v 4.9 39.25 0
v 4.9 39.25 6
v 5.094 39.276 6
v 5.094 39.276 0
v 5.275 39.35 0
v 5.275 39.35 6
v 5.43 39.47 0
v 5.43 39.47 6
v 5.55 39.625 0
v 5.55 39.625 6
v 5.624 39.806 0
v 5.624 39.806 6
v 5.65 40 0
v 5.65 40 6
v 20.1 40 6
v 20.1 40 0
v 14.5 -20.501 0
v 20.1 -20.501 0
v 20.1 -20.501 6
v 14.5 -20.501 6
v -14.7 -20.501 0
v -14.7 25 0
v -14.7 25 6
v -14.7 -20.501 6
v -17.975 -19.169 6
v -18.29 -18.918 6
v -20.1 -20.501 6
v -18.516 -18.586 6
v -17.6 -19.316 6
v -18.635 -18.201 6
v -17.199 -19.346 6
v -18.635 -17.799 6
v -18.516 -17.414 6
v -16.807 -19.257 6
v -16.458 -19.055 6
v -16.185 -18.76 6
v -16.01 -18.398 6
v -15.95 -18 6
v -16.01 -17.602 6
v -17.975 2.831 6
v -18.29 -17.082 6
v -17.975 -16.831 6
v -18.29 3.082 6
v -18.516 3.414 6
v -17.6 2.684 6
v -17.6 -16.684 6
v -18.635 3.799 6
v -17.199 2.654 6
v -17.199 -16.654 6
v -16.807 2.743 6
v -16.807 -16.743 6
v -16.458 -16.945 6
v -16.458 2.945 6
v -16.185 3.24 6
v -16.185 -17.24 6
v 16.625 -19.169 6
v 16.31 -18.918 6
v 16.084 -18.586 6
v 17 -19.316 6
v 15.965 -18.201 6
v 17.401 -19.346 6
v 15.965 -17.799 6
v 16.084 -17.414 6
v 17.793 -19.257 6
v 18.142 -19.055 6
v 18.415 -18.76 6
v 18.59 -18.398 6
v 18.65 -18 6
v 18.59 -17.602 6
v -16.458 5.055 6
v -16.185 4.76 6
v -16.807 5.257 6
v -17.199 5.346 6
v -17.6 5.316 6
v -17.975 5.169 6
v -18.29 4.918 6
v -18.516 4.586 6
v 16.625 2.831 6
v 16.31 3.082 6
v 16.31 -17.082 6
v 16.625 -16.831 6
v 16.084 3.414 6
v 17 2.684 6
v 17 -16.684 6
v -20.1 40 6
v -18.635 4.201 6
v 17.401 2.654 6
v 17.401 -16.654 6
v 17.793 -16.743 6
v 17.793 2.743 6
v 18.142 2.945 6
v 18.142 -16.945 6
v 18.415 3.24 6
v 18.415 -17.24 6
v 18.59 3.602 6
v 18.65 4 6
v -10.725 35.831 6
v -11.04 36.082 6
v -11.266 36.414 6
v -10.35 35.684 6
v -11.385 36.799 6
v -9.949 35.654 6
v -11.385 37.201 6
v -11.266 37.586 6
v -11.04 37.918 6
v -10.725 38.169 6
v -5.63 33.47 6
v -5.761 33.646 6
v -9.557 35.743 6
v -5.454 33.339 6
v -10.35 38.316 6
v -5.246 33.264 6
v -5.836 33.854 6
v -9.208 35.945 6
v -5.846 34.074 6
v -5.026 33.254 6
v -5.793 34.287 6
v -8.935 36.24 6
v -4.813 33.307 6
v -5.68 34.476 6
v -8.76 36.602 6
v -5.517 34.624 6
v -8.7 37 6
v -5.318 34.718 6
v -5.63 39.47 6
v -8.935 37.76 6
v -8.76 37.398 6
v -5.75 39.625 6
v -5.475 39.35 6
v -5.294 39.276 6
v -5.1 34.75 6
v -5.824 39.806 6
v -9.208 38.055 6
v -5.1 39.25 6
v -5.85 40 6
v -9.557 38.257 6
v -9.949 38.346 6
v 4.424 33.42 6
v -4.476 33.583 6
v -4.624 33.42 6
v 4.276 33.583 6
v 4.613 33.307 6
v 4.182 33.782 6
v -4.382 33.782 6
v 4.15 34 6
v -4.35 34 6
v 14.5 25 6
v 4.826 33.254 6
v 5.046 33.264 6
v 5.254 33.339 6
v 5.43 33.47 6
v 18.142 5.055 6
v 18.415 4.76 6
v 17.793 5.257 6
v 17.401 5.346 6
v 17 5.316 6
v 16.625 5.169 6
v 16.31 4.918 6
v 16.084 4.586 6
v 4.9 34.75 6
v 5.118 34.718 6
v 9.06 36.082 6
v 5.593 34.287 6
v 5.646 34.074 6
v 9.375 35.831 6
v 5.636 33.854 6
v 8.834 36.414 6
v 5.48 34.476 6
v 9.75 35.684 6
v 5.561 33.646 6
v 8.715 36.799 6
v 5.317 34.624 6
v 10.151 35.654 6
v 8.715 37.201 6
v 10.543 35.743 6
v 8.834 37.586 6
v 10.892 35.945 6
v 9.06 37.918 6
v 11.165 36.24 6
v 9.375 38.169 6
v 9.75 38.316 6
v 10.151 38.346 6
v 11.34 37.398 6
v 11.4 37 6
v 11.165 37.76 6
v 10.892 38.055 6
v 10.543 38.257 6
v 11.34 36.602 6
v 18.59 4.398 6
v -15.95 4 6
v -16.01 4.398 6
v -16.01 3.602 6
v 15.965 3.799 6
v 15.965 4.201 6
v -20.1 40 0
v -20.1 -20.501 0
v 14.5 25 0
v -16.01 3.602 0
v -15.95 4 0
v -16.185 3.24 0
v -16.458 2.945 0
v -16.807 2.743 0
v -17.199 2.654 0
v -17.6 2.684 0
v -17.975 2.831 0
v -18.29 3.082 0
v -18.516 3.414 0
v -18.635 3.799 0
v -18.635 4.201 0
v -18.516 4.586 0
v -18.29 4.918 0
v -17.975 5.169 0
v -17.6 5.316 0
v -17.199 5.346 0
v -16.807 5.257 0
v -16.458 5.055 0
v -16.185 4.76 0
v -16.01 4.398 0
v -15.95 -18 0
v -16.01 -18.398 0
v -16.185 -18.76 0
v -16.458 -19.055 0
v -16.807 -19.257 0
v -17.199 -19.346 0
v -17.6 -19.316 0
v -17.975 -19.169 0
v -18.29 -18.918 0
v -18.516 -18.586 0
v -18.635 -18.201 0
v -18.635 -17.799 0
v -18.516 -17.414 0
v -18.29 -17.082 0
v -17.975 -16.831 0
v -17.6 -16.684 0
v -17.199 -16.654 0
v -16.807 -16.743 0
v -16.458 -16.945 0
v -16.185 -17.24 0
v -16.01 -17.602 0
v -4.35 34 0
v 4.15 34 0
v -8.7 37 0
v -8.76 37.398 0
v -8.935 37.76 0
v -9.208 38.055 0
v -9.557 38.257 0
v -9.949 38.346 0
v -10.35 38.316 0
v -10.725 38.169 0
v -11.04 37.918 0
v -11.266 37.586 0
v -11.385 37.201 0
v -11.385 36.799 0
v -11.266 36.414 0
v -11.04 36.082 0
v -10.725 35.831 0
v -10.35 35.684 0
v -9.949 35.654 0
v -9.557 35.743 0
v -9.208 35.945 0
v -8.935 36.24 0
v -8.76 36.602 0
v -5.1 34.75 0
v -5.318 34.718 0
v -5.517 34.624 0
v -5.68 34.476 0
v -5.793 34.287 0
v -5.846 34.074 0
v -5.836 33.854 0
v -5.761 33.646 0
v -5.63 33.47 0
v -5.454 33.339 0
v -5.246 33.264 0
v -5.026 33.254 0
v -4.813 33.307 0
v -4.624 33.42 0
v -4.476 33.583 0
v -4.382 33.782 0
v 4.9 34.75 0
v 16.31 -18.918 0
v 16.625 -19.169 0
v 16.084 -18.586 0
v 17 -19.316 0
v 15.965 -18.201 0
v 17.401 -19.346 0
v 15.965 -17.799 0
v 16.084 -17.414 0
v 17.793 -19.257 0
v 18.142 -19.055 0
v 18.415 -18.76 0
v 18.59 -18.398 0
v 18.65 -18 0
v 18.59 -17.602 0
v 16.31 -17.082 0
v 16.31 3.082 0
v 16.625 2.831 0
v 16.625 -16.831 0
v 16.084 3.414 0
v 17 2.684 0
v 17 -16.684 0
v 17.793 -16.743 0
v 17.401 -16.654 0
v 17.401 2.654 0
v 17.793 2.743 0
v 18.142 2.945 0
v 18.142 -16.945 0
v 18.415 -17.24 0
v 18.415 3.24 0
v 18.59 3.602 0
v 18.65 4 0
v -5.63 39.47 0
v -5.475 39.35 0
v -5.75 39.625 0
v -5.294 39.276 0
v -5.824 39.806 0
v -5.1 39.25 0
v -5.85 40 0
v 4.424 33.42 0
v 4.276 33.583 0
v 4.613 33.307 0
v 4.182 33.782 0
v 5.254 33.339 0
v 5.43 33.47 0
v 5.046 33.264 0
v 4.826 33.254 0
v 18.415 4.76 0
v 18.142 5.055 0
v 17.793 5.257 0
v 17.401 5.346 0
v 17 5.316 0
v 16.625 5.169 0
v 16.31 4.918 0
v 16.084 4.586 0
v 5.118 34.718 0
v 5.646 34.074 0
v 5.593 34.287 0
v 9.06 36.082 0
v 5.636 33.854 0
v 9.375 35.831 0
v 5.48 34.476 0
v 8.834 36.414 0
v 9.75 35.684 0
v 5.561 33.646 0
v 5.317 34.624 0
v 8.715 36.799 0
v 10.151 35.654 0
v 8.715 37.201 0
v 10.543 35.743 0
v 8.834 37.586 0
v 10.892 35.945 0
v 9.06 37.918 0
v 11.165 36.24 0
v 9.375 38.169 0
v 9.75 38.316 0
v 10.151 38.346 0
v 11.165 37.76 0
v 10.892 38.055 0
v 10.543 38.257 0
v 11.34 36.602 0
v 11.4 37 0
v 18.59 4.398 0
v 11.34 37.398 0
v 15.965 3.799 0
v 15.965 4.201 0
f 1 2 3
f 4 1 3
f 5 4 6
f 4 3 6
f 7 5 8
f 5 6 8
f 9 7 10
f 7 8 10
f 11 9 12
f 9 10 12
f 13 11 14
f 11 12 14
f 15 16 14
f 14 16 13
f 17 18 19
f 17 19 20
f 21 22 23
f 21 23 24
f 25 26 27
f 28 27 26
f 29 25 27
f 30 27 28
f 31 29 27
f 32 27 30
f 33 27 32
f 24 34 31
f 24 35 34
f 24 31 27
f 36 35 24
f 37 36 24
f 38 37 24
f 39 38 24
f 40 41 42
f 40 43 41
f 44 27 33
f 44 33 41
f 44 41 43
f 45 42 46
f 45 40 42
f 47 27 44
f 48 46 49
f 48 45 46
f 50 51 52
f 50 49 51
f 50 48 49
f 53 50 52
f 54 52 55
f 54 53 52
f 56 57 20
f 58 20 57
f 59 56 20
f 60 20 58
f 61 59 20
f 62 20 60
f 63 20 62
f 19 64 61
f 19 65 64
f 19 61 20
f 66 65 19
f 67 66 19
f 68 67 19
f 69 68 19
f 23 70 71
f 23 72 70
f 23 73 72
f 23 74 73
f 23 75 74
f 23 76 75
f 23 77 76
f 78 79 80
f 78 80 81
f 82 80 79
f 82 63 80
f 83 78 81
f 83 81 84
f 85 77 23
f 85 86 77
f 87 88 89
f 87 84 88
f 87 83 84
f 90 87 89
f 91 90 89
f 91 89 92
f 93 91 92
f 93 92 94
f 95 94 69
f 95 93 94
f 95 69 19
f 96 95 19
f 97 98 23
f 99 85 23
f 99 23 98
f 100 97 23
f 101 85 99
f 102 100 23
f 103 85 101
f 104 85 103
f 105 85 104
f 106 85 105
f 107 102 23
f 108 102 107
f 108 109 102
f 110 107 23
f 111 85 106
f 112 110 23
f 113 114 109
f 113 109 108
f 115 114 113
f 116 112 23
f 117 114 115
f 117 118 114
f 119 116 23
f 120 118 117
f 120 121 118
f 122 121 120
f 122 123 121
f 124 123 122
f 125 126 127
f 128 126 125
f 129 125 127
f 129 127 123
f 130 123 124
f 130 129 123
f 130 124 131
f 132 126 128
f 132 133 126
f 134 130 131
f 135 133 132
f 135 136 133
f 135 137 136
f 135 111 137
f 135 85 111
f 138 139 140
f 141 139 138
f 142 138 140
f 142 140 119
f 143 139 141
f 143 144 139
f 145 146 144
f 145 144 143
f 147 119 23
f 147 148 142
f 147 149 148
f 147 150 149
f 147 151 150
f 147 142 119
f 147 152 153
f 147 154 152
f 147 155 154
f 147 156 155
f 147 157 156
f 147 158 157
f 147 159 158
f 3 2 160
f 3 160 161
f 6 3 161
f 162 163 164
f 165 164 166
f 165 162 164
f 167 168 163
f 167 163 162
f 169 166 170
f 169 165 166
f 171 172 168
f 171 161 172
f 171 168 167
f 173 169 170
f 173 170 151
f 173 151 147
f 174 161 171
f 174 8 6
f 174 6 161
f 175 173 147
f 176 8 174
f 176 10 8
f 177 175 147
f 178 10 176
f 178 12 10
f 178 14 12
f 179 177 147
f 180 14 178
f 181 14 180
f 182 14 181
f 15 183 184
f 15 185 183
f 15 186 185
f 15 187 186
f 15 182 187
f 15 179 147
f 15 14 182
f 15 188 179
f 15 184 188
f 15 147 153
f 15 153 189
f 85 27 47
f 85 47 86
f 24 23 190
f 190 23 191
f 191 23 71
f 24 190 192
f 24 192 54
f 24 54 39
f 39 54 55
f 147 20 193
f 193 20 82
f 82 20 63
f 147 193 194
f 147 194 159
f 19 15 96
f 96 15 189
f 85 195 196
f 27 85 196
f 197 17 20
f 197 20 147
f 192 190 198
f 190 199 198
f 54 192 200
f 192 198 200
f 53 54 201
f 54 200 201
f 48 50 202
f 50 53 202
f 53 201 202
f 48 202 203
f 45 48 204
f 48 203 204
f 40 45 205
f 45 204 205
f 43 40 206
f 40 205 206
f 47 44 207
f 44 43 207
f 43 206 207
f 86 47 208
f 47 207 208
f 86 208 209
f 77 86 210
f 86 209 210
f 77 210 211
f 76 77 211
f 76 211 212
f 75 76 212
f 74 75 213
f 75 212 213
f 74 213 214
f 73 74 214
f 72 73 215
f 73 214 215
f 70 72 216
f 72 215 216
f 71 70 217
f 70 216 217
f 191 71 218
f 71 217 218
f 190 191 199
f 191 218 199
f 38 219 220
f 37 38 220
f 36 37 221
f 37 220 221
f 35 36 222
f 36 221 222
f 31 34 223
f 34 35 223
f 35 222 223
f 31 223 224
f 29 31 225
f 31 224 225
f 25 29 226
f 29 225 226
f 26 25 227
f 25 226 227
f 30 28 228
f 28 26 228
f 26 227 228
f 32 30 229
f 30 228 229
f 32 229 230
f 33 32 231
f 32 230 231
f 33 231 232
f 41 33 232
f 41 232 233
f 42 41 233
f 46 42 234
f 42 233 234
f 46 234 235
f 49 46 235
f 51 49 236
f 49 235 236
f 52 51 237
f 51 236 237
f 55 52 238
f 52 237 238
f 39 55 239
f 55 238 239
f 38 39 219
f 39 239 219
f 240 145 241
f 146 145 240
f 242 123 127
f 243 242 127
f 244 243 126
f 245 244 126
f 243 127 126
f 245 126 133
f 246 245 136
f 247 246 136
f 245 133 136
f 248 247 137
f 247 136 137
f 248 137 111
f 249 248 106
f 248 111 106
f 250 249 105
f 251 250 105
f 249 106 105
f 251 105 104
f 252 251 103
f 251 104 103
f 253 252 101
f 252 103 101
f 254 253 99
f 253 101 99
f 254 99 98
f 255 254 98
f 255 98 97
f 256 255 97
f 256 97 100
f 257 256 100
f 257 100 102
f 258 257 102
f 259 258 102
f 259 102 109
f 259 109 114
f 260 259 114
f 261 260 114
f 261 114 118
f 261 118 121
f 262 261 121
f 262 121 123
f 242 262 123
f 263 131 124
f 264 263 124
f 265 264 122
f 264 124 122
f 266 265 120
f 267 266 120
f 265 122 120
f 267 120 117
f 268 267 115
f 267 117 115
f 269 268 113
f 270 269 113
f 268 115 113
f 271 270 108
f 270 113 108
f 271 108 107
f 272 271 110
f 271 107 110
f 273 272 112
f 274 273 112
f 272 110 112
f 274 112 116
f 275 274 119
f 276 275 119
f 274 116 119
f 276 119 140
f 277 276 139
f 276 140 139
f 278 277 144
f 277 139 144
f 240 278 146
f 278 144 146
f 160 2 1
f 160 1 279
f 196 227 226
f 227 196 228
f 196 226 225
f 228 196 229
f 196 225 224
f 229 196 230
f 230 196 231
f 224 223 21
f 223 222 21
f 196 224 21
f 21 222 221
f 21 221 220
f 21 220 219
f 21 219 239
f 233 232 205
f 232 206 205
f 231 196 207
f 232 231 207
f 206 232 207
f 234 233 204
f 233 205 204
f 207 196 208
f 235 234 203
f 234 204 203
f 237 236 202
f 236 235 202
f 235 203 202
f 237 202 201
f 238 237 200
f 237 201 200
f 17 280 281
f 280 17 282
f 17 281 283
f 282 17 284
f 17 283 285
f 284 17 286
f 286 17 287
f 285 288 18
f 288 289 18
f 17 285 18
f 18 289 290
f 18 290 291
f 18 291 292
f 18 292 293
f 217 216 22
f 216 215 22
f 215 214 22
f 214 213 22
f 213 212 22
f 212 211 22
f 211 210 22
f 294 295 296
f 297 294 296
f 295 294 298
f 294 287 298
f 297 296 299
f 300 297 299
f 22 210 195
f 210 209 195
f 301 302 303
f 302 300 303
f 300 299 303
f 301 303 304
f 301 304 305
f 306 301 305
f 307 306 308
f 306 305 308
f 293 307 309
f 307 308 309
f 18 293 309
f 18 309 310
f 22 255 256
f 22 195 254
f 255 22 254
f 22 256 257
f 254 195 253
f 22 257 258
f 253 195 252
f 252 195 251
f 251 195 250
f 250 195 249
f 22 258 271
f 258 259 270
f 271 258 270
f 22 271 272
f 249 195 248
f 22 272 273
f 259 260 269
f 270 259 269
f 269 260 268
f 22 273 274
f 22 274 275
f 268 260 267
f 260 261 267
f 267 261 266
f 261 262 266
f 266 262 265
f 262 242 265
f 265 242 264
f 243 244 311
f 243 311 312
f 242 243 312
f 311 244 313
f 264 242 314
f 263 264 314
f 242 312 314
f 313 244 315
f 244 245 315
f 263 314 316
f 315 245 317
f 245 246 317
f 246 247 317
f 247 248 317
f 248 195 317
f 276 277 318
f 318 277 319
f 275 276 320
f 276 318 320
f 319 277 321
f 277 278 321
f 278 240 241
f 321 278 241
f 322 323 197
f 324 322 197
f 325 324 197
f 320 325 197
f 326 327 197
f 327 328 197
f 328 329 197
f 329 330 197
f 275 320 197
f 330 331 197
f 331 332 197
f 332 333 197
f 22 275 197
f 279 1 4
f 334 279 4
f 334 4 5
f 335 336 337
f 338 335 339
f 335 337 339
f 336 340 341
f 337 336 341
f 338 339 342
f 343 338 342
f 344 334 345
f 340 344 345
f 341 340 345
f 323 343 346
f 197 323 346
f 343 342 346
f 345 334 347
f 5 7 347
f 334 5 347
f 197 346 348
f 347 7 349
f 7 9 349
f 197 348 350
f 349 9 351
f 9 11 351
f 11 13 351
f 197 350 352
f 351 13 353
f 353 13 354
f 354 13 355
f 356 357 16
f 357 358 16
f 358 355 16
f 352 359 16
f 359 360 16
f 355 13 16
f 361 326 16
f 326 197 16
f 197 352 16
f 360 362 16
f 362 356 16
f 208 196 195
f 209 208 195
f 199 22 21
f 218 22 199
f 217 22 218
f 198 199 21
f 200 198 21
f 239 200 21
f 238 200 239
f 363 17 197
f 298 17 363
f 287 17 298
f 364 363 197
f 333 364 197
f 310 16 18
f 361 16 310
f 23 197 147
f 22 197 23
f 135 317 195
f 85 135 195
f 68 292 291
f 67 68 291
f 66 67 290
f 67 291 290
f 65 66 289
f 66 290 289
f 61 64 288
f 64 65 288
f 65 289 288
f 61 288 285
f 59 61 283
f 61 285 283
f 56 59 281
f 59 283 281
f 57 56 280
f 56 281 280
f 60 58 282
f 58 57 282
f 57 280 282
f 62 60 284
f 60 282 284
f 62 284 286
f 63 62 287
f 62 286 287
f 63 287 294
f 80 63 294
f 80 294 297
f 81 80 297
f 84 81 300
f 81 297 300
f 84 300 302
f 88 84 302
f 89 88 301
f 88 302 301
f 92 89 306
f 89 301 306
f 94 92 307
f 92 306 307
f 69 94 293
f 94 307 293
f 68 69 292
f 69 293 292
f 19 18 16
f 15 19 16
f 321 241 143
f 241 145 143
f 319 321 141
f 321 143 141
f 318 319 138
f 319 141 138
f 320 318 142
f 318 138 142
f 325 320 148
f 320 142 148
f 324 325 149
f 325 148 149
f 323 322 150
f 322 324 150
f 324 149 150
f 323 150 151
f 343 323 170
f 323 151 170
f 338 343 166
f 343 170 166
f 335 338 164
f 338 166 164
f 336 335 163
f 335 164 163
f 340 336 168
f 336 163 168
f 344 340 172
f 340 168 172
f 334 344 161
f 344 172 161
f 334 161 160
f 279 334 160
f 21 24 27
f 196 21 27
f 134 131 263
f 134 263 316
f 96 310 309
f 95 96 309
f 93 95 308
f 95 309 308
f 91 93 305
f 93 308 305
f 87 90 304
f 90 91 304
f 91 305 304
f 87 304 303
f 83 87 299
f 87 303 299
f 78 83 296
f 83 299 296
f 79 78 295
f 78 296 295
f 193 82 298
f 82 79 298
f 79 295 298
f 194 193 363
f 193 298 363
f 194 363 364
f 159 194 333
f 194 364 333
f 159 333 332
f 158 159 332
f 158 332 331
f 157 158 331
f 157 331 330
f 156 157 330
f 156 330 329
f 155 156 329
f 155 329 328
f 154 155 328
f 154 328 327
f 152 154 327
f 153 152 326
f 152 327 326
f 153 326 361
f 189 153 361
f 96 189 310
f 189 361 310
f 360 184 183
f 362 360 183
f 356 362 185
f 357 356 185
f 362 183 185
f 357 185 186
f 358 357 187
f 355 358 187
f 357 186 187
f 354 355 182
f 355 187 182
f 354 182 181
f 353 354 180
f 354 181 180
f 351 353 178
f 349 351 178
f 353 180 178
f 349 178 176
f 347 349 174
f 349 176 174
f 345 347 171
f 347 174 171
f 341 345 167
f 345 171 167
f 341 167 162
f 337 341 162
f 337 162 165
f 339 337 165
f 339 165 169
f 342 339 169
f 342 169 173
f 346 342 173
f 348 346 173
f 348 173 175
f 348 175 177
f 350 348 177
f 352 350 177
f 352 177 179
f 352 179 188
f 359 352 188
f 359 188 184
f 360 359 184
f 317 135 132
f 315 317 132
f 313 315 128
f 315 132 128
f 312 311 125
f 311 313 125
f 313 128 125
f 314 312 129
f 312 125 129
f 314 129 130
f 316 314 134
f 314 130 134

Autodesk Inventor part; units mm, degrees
ref_plane "YZ Plane" through (0, 0, 0) normal (1, 0, 0) x (0, 1, 0)
ref_plane "XZ Plane" through (0, 0, 0) normal (0, 1, 0) x (-1, 0, 0)
ref_plane "XY Plane" through (0, 0, 0) normal (0, 0, 1) x (1, 0, 0)
ref_plane "작업 평면1" through (0, 0, 0) normal (0, 0, 1) x (1, 0, 0)
sketch "스케치1" plane through (0, 0, 0) normal (0, 0, 1) x (1, 0, 0)
  line L0 (14.5, -41) -> (14.5, 11) projected
  line L1 (20.1, -39.6766) -> (20.1, 4.5766) projected
  line L2 (-20.1, 4.5766) -> (-20.1, -39.6766) projected
  line L3 (-14.5, 11) -> (-14.5, -41) projected
  circle A0 centre (-17.3, -18) radius 1.35 projected
  circle A1 centre (17.3, -18) radius 1.35 projected
  circle A2 centre (17.3, 4) radius 1.35 projected
  circle A3 centre (-17.3, 4) radius 1.35 projected
  circle A4 centre (17.3, -18) radius 1.45
  circle A5 centre (-17.3, -18) radius 1.45
  circle A6 centre (-17.3, 4) radius 1.45
  circle A7 centre (17.3, 4) radius 1.45
  line L4 (14.7, -41) -> (14.7, 11)
  line L5 (-14.7, 11) -> (-14.7, -41)
  line L6 (20.1, -20.5011) -> (-20.1, -20.5011)
  line L7 (-20.1, 0) -> (-20.1, 40)
  line L8 (20.1, -20.5011) -> (20.1, 40)
  line L9 (20.1, 40) -> (-20.1, 40)
  line L10 (14.5, 0) -> (14.5, 25)
  line L11 (14.5, 25) -> (-14.7, 25)
  line L12 (-14.7, 25) -> (-14.7, 0)
  line L13 (20.1, 40) -> (15.1, 40)
  line L14 (20.1, 40) -> (10.05, 40)
  line L15 (10.05, 40) -> (0, 40)
  line L16 (0, 40) -> (-10.05, 40)
  line L17 (-10.05, 40) -> (-20.1, 40)
  line L18 (20.1, 25) -> (20.1, 32.5)
  circle A8 centre (10.05, 32.5) radius 1.4
  circle A9 centre (-10.05, 32.5) radius 1.4
  point P0 (0, 0)
  point P1 (0, -20.5011)
  point P2 (-14.7, -20.5011)
  point P3 (14.5, -20.5011)
  dimension "d0" = 0.1
  dimension "d1" = 0.1
  dimension "d2" = -0.1
  dimension "d3" = 0.1
  dimension "d4" = 0.2
  dimension "d5" = 0.2
  dimension "d6" = 20.5011
  dimension "d7" = 40
  dimension "d9" = 15
  dimension "d12" = 5
  dimension "d13" = 40.2
  dimension "d14" = 10.05
  dimension "d15" = 10.05
  dimension "d16" = 10.05
  dimension "d17" = 10.05
  dimension "d18" = 7.5
  dimension "d19" = 2.8
  dimension "d20" = 2.8
  dimension "d21" = 20.1
extrude "돌출1" add sketch "스케치1" along normal blind 6 contours L0 L10 L11 L12 L5 L6 L2 L7 L9 L8 L1 | A4 | A5 | A6 | A7 | A8 | A9
sketch "스케치3" plane through (-20.1, 40, 0) normal (0, 1, 0) x (1, 0, 0)
  line L0 (40.2, 0) -> (0, 0) projected
  line L1 (0, 0) -> (0, -6) projected
  line L2 (40.2, -6) -> (0, -6) projected
  line L3 (40.2, 0) -> (40.2, -6) projected
  point P0 (20.1, 0)
  dimension "d29" = 40.2
sketch "스케치4" plane through (0, 0, 6) normal (0, 0, 1) x (1, 0, 0)
  line L0 (20.1, 40) -> (-20.1, 40) projected
  line L1 (-20.1, 40) -> (20.1, 40)
  line L2 (20.1, 40) -> (20.1, 34)
  line L3 (20.1, 34) -> (-20.1, 34)
  line L4 (-20.1, 34) -> (-20.1, 40)
  line L5 (-20.1, 40) -> (-10.05, 40)
  line L6 (-10.05, 40) -> (10.05, 40)
  circle A0 centre (-10.05, 37) radius 1.35
  circle A1 centre (10.05, 37) radius 1.35
  point P0 (0, 0)
  dimension "d30" = 6
  dimension "d31" = 10.05
  dimension "d32" = 20.1
  dimension "d33" = 2.7
  dimension "d34" = 2.7
extrude "돌출3" cut sketch "스케치4" against normal blind 10 contours A0 | A1
sketch "스케치5" plane through (0, 0, 6) normal (0, 0, 1) x (1, 0, 0)
  circle A0 centre (10.05, 37) radius 1.35 projected
  circle A1 centre (-10.05, 37) radius 1.35 projected
  line L0 (14.5, 25) -> (14.5, -20.5011) projected
  line L1 (14.5, -20.5011) -> (20.1, -20.5011) projected
  line L2 (20.1, -20.5011) -> (20.1, 40) projected
  line L3 (20.1, 40) -> (-20.1, 40) projected
  line L4 (-20.1, 40) -> (-20.1, -20.5011) projected
  line L5 (-20.1, -20.5011) -> (-14.7, -20.5011) projected
  line L6 (-14.7, -20.5011) -> (-14.7, 25) projected
  line L7 (-14.7, 25) -> (14.5, 25) projected
  circle A2 centre (17.3, 4) radius 1.35 projected
  circle A3 centre (17.3, -18) radius 1.35 projected
  circle A4 centre (-17.3, -18) radius 1.35 projected
  circle A5 centre (-17.3, 4) radius 1.35 projected
  line L8 (4.9, 34) -> (-5.1, 34)
  line L9 (-5.1, 34) -> (-5.1, 40)
  line L10 (-5.1, 40) -> (4.9, 40)
  line L11 (4.9, 40) -> (4.9, 34)
  line L12 (4.9, 34) -> (-5.1, 40) construction
  line L13 (-5.1, 34) -> (4.9, 40) construction
  circle A6 centre (-5.1, 40) radius 0.75
  circle A7 centre (-5.1, 34) radius 0.75
  circle A8 centre (4.9, 34) radius 0.75
  circle A9 centre (4.9, 40) radius 0.75
  point P0 (0, 0)
  point P1 (-0.1, 37)
  point P2 (4.15, 34)
  point P3 (4.9, 34.75)
  point P4 (-5.1, 34.75)
  point P5 (-4.35, 34)
  point P6 (-5.1, 39.25)
  point P7 (-4.35, 40)
  point P8 (4.9, 39.25)
  point P9 (5.65, 40)
  dimension "d37" = 10
  dimension "d40" = 1.5
  dimension "d41" = 1.5
  dimension "d42" = 1.5
  dimension "d43" = 1.5
extrude "돌출4" cut sketch "스케치5" against normal blind 6 contours A9 L11 L3 | L11 A9 L3 | A9 L11 A8 L8 A7 L9 A6 L3 | A6 L3 | L3 L9 A6 | A6 L9 L3 | A8 L8 L11 | L11 L8 A8 | A7 L8 L9 | L9 L8 A7
properties part number "feet_holder2" material "PMMA 플라스틱"
